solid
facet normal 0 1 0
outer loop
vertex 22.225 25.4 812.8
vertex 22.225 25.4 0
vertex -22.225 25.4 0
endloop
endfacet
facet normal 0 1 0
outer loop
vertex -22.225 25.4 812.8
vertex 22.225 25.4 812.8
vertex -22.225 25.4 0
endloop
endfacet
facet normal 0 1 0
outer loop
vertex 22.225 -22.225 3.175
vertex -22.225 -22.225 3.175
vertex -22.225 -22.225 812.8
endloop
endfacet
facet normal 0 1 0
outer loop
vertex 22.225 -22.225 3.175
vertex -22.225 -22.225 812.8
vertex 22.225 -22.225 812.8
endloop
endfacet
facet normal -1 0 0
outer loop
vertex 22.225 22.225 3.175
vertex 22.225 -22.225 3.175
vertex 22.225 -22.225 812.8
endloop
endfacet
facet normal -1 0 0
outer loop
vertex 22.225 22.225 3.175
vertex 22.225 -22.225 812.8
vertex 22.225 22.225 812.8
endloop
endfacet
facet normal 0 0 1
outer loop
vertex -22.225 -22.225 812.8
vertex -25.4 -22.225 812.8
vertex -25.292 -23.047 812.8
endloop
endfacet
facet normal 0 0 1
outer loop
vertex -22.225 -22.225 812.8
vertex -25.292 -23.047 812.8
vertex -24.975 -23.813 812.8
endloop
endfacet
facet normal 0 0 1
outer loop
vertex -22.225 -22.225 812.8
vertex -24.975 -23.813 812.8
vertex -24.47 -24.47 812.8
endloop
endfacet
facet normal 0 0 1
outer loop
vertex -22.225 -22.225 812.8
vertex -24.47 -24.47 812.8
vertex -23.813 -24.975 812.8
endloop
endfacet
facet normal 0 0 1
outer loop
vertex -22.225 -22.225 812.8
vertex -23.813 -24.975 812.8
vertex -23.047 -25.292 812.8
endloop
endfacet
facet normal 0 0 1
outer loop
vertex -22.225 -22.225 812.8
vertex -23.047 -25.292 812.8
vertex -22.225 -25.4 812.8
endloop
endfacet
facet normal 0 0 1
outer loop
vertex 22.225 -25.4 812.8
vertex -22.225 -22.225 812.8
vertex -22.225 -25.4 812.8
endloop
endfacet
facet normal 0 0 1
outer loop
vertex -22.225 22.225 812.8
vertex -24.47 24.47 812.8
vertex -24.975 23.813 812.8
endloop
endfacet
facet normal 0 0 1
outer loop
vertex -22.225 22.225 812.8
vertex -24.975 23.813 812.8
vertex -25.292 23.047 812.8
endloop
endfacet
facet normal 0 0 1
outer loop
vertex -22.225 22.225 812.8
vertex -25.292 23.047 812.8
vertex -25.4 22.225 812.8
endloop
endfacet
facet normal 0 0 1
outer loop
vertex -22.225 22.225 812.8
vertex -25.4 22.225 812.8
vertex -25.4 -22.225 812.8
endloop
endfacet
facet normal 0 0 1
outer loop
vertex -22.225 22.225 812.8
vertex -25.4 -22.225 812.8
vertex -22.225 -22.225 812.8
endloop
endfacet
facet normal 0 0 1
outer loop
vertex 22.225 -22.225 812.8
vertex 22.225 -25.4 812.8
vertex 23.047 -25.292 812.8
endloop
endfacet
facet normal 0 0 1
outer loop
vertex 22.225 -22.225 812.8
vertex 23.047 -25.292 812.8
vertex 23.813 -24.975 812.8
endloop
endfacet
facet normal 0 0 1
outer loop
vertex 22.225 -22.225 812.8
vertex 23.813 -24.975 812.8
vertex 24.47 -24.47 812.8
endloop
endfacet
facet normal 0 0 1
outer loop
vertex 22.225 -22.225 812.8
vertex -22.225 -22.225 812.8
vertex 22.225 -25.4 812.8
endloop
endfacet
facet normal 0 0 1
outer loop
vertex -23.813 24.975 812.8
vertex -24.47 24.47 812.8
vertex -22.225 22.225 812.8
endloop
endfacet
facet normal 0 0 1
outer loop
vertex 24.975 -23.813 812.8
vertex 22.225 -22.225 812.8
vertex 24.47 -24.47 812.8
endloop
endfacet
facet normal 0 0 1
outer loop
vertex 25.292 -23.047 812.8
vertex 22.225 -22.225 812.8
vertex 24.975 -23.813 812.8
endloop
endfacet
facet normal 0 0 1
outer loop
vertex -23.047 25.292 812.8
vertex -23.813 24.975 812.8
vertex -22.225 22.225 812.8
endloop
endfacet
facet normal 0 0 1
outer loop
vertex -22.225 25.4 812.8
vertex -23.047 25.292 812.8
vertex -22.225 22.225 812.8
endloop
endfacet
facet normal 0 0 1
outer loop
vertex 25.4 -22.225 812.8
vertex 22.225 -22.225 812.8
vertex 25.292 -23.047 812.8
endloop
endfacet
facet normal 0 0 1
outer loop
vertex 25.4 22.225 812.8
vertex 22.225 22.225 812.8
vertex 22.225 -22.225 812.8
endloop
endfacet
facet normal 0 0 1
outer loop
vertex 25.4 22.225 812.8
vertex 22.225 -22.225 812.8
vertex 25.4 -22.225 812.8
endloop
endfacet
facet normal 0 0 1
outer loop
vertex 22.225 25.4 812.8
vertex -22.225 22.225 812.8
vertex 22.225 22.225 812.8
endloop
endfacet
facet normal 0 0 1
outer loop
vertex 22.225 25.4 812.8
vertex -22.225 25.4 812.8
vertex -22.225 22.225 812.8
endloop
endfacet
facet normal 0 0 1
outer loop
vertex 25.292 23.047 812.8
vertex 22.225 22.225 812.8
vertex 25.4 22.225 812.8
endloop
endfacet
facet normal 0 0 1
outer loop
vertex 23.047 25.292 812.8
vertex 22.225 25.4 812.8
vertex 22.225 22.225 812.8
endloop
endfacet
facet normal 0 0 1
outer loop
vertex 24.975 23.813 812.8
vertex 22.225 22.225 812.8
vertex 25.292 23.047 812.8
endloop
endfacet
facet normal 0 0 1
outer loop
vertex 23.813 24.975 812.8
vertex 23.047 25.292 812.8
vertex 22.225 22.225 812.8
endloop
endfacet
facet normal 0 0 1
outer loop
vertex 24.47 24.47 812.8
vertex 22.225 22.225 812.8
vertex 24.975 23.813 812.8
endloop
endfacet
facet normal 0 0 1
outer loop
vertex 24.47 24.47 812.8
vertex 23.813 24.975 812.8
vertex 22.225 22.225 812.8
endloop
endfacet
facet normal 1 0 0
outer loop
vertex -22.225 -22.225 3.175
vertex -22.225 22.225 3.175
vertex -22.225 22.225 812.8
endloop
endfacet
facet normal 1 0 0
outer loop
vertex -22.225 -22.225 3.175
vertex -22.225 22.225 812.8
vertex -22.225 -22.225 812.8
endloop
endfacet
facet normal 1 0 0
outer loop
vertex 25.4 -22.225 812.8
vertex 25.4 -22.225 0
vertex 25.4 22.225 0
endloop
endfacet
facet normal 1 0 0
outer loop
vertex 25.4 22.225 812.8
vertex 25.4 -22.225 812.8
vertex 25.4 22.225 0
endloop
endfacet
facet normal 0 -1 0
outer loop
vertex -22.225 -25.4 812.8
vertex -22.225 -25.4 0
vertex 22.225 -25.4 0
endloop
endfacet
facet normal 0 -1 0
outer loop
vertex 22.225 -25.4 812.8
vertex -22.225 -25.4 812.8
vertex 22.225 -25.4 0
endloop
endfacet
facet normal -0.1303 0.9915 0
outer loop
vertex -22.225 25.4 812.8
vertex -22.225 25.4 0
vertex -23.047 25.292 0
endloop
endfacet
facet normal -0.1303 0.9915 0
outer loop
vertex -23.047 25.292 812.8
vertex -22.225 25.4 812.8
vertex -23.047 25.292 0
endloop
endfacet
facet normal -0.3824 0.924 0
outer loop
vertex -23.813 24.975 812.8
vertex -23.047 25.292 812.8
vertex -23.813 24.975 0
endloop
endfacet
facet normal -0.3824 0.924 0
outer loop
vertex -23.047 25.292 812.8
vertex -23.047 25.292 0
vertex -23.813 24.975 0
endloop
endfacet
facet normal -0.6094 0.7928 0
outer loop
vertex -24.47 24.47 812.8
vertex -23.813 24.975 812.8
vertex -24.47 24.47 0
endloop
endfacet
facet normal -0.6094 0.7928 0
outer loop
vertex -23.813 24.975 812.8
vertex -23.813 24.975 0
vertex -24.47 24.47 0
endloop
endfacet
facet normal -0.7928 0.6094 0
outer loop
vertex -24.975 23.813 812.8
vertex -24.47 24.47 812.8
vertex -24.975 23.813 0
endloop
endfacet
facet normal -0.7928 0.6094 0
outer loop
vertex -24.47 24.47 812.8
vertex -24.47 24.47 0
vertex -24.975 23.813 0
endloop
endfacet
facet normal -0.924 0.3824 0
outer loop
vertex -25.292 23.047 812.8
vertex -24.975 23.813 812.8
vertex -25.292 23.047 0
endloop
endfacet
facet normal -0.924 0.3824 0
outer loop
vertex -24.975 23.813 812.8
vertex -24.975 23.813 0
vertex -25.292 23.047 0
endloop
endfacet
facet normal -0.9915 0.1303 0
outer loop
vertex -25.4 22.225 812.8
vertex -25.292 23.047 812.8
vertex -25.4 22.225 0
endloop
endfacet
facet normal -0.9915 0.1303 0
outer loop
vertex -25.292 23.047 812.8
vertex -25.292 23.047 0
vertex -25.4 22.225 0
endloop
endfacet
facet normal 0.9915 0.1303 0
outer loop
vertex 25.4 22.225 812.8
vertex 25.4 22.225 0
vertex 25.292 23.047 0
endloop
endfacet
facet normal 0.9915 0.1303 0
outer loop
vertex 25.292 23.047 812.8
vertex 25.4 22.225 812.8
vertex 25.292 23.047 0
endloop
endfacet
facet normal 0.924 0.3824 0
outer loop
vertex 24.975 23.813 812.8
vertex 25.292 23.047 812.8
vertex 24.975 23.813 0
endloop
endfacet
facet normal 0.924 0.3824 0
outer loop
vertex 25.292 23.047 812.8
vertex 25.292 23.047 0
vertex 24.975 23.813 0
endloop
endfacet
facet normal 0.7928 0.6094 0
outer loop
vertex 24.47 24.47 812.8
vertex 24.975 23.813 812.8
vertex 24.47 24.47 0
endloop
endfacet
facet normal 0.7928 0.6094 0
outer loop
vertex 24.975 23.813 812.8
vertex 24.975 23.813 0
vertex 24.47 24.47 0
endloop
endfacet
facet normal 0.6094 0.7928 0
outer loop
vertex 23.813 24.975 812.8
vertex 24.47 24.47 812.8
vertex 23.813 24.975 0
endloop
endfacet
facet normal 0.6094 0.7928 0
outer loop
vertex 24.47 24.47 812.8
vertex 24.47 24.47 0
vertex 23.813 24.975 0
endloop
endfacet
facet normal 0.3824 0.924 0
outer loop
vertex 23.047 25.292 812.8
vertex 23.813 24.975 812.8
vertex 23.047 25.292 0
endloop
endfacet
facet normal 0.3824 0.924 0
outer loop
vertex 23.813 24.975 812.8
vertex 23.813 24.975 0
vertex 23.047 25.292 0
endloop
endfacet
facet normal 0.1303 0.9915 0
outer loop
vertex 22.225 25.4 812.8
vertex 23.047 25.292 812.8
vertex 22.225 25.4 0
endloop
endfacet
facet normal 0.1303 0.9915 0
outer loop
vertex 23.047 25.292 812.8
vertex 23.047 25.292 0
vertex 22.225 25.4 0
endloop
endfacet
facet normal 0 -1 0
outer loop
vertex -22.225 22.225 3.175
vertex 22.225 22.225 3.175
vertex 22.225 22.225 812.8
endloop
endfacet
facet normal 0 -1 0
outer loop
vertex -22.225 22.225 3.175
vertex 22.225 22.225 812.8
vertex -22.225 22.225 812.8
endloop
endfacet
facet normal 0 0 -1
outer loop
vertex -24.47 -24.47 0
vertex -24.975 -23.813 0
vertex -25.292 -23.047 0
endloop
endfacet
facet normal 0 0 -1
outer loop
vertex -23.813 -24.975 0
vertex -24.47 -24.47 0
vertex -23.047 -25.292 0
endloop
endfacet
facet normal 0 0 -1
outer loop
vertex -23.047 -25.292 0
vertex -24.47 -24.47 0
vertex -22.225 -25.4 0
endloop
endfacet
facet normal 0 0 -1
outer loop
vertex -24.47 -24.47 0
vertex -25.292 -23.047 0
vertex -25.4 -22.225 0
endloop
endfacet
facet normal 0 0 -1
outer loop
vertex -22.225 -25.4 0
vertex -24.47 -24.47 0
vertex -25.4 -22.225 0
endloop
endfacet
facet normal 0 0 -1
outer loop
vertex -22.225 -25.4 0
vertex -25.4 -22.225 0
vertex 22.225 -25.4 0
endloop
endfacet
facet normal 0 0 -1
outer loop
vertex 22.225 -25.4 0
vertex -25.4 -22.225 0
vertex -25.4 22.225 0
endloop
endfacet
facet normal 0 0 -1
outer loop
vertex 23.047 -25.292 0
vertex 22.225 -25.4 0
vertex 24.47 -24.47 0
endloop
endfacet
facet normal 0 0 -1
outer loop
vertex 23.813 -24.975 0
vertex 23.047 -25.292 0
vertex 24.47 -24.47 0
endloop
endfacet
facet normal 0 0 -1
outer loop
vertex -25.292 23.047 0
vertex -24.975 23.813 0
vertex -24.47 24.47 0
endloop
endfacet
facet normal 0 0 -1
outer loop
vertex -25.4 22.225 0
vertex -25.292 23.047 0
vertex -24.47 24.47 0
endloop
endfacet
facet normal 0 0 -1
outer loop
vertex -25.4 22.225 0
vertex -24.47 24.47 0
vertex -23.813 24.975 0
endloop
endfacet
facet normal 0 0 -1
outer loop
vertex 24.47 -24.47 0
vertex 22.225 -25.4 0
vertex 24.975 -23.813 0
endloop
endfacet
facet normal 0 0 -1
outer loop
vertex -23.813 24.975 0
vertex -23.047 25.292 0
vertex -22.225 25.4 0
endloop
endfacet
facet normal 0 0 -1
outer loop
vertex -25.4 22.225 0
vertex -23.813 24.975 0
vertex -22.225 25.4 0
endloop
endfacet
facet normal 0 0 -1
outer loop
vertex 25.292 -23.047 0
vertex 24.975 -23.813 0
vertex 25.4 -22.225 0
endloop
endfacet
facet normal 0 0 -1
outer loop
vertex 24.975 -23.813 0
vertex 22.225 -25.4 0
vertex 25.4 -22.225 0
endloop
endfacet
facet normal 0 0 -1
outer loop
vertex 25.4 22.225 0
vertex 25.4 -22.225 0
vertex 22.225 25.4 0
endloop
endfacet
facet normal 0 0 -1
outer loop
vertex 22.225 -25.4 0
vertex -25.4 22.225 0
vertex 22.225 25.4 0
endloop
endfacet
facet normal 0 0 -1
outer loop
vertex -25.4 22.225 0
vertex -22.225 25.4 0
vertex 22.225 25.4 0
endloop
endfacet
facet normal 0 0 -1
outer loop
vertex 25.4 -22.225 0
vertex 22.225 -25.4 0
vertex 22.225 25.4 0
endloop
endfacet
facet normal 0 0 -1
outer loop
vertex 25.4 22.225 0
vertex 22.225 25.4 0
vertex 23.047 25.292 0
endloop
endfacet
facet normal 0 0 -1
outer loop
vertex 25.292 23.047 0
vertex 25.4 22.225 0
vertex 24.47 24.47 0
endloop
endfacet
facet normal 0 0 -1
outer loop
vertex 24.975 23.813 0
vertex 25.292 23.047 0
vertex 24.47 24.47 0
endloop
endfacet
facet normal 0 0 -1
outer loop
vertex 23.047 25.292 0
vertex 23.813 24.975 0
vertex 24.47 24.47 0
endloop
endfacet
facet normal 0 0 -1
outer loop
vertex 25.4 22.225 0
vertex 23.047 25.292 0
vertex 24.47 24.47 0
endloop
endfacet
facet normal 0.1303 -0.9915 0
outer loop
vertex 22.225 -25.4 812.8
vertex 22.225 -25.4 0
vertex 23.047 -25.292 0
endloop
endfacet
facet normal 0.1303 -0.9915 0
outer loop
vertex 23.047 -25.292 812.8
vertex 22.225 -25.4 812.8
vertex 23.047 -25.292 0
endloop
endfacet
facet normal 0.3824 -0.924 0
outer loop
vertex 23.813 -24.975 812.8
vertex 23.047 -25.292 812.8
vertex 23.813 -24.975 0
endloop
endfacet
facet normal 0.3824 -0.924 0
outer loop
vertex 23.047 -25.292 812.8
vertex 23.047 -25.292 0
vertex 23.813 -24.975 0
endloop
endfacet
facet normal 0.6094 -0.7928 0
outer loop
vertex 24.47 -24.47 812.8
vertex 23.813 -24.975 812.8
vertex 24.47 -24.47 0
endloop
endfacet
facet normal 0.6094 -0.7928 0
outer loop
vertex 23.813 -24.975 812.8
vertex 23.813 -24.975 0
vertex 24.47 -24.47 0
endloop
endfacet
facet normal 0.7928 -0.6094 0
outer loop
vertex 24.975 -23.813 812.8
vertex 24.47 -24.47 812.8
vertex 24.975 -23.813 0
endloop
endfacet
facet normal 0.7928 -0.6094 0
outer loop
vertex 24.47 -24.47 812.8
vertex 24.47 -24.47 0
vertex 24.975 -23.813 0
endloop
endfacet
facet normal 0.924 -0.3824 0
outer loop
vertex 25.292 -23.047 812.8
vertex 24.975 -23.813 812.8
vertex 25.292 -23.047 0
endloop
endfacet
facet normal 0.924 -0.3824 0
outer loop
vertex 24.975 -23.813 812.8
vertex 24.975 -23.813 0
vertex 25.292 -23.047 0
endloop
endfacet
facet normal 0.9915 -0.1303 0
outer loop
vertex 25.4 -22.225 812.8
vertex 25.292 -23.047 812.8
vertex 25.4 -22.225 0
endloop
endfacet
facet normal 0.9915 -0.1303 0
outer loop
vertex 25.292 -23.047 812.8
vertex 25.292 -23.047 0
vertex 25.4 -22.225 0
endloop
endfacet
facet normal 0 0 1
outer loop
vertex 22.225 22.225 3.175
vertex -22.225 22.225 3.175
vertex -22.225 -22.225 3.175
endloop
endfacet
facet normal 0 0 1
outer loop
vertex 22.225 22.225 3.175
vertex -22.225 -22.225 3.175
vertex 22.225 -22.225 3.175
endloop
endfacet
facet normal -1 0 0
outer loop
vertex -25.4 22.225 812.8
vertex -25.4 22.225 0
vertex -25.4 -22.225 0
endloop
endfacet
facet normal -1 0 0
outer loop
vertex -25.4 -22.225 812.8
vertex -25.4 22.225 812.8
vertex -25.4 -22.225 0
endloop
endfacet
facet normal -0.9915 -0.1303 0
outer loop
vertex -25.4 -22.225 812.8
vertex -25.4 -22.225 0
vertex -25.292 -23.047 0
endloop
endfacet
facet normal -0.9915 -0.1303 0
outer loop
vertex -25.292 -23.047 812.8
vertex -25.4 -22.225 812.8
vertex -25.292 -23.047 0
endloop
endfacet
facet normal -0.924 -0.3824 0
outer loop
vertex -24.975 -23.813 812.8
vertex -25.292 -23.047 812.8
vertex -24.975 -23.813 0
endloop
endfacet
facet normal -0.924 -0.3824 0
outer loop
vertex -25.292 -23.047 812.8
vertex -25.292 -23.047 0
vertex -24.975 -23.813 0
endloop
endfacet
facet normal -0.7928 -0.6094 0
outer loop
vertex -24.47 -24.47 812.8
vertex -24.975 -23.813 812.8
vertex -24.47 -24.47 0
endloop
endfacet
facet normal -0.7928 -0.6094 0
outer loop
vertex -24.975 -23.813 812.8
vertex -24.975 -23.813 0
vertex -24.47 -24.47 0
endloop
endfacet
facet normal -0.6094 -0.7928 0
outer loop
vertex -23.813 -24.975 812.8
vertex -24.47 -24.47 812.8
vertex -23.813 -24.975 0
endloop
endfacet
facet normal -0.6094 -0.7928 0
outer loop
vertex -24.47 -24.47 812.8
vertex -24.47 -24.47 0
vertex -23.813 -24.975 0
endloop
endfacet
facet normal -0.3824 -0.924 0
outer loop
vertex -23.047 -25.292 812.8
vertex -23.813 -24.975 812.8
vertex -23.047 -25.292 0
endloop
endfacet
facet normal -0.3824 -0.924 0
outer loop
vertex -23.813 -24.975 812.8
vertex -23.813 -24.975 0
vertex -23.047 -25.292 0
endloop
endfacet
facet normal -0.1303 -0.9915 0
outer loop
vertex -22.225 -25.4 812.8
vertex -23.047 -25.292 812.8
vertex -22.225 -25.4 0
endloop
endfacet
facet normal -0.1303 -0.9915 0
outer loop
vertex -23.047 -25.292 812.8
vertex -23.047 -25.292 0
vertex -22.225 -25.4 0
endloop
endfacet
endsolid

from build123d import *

# Parameters (mm, degrees)
F1_DEPTH = 812.8
F2_T     = 3.175


# Not quite as in the source:
# - a shell that OpenCascade refuses in one call is made with other operations: the cavity is built on its own and cut out


with BuildPart() as f1:
    # F0 (on Top) → F1 (new body)
    with BuildSketch(Plane.XY):
        with BuildLine():
            Line((22.225, 25.4), (-22.225, 25.4))
            ThreePointArc((-22.225, 25.4), (-24.4700640303, 24.4700640303), (-25.4, 22.225))
            Line((-25.4, 22.225), (-25.4, -22.225))
            ThreePointArc((-25.4, -22.225), (-24.4700640303, -24.4700640303), (-22.225, -25.4))
            Line((-22.225, -25.4), (22.225, -25.4))
            ThreePointArc((22.225, -25.4), (24.4700640303, -24.4700640303), (25.4, -22.225))
            Line((25.4, -22.225), (25.4, 22.225))
            ThreePointArc((25.4, 22.225), (24.4700640303, 24.4700640303), (22.225, 25.4))
        make_face()
    extrude(amount=F1_DEPTH)

    # F2: shell of thickness 3.175, made by hand


with BuildPart() as f2_core1:
    # F2_t2: copy of F1
    add(f1.part)

    # the walls: a layer under each face that stays
    f2_faces = [f2_core1.faces().sort_by_distance(p)[0] for p in [
        (0, 25.4, 406.4),
        (-25.4, 0, 406.4),
        (0, -25.4, 406.4),
        (25.4, 0, 406.4),
        (0, 0, 0),
    ]]
    thicken(f2_faces, amount=-F2_T, mode=Mode.SUBTRACT)


with BuildPart() as f1_1:
    add(f1.part)

    # what is left inside the walls is the cavity
    f2_cavity = [f2_core1.part.solids().sort_by_distance(p)[0] for p in [
        (0, 22.19325, 542.925),
    ]]
    add(f2_cavity, mode=Mode.SUBTRACT)


solid = f1_1.part
